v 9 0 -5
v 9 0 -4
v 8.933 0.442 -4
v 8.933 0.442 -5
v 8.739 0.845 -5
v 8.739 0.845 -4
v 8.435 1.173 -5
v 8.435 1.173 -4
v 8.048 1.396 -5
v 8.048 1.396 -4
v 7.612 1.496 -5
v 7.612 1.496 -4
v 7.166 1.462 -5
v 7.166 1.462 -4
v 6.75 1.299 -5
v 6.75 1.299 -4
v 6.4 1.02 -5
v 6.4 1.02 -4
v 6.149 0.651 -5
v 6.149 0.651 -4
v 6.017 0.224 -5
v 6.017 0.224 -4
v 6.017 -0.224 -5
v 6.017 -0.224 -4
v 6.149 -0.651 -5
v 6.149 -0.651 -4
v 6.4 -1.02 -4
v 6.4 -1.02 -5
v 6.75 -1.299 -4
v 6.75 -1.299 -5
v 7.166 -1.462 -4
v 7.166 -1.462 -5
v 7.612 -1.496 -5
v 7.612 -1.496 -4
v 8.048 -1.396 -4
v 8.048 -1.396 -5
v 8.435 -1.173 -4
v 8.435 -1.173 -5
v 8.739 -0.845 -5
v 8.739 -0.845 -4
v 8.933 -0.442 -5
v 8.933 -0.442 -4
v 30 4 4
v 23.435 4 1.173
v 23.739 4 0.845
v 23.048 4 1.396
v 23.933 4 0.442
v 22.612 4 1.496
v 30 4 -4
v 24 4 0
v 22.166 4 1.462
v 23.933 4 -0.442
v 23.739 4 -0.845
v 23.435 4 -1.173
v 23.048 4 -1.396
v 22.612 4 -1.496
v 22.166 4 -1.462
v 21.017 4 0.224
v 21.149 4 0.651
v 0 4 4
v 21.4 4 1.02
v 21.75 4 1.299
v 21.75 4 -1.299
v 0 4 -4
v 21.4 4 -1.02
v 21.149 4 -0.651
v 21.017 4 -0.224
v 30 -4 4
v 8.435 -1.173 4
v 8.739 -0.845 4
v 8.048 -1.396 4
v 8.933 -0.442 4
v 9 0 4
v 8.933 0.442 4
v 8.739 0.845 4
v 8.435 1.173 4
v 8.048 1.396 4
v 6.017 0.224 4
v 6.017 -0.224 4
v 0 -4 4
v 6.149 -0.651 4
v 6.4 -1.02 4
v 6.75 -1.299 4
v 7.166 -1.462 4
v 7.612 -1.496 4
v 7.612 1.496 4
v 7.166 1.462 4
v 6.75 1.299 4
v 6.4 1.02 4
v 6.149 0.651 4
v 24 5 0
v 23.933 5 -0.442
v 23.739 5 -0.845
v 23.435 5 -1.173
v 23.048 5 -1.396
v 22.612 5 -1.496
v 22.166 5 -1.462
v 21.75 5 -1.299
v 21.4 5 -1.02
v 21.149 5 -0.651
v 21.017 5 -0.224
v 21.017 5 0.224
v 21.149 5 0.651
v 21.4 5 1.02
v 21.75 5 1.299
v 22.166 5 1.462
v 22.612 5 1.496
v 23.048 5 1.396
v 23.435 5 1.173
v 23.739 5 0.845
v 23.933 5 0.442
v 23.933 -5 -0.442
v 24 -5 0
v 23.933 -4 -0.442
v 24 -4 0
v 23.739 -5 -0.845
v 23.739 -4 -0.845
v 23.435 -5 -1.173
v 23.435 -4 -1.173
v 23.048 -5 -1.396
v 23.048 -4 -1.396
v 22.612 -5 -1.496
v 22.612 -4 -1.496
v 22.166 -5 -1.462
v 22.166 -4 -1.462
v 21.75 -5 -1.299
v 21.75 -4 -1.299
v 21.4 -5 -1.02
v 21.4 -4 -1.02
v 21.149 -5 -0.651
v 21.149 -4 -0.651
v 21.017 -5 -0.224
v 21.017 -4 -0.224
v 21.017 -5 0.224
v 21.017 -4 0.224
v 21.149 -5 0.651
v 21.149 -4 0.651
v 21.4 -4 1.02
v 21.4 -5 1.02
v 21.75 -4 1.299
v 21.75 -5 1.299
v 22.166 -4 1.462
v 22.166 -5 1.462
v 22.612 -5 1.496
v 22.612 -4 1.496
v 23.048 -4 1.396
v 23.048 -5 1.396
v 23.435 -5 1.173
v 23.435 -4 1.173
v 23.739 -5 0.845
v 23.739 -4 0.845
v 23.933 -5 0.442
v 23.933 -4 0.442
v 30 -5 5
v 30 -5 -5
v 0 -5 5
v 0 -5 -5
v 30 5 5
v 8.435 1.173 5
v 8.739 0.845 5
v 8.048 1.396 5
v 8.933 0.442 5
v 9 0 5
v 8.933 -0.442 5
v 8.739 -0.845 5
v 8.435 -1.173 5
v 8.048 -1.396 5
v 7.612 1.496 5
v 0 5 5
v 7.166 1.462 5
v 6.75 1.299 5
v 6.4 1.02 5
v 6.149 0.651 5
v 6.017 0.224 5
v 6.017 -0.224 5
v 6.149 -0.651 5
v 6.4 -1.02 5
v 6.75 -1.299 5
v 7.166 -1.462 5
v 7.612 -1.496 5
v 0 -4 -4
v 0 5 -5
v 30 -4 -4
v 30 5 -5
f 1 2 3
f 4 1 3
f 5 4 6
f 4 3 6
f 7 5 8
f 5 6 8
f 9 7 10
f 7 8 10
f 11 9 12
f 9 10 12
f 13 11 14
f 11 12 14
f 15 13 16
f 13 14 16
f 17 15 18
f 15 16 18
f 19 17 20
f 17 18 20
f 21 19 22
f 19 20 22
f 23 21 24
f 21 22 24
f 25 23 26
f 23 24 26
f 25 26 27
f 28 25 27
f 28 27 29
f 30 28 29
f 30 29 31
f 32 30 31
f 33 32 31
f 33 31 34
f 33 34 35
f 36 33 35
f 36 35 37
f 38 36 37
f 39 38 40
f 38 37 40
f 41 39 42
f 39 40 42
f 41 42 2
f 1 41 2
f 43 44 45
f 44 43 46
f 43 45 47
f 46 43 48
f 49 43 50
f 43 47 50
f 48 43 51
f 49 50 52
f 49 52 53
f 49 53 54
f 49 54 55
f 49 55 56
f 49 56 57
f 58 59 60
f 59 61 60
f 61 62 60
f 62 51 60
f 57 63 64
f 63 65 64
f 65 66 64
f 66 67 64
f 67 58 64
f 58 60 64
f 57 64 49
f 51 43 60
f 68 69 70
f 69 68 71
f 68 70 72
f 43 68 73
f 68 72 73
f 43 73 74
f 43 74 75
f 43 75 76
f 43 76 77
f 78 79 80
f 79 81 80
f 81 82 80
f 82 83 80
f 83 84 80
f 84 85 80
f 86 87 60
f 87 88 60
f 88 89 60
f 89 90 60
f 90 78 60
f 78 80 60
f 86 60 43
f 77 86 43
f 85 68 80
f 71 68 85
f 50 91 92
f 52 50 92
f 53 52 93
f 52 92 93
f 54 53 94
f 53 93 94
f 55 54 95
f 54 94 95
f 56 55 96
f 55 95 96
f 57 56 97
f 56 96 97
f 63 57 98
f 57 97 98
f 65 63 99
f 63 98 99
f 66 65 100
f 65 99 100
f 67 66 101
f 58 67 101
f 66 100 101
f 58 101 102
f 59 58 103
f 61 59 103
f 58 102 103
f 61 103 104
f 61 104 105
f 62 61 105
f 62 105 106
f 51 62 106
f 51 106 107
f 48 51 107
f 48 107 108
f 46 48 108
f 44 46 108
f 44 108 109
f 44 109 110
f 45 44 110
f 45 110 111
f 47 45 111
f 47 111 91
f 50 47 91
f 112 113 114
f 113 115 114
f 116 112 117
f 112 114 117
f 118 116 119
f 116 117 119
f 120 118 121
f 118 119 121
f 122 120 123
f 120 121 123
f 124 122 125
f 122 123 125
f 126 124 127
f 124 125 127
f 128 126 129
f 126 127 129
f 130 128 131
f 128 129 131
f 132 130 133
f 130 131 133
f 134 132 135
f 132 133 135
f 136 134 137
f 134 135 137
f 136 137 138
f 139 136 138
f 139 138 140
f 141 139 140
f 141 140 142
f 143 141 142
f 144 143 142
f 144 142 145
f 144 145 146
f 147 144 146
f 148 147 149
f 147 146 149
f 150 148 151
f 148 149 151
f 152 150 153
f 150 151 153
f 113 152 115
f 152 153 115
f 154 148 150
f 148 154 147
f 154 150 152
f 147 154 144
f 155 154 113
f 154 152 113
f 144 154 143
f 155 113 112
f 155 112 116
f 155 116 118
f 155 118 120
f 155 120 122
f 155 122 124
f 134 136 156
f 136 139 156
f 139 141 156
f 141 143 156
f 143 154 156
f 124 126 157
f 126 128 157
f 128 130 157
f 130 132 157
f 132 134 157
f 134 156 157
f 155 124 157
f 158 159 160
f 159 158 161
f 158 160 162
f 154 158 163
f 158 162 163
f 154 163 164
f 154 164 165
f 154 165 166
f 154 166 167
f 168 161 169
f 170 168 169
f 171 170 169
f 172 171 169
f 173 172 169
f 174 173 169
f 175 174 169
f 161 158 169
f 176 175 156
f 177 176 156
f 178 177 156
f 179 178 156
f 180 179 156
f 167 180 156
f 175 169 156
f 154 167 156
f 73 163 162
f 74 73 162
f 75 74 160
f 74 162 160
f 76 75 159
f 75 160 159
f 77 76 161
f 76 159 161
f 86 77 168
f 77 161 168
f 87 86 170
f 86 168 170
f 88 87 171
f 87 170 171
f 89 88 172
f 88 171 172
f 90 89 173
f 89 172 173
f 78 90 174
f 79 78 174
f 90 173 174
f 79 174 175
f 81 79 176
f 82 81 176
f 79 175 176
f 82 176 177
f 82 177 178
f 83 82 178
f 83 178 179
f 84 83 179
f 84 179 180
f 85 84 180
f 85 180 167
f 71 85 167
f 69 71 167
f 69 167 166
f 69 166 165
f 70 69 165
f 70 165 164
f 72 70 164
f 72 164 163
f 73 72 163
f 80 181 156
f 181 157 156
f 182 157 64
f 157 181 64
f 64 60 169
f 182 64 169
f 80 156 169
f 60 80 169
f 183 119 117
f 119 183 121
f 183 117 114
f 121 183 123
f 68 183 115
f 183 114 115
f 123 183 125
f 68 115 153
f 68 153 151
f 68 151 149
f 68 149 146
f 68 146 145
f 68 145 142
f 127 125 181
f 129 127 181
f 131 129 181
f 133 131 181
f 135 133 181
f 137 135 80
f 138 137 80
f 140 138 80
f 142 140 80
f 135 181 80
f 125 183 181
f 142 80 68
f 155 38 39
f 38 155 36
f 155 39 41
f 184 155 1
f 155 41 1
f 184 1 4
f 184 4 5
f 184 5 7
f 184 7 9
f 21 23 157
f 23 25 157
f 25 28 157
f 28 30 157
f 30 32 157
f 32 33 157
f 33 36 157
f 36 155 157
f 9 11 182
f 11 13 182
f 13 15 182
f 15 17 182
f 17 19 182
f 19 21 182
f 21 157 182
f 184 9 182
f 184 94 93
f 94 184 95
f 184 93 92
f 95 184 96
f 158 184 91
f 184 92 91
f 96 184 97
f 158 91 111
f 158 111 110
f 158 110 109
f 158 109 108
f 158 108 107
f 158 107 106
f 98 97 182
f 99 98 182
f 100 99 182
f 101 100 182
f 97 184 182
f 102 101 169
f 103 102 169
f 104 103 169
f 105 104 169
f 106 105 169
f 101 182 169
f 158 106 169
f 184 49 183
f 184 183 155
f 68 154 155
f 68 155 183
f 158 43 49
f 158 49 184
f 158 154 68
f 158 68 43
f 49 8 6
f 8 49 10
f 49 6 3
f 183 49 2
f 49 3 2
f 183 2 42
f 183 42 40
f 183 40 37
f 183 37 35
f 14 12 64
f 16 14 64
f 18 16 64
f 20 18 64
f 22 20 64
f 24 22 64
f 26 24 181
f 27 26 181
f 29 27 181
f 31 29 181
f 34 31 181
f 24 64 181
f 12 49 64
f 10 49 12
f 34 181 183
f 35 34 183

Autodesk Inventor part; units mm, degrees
ref_plane "YZ Plane" through (0, 0, 0) normal (1, 0, 0) x (0, 1, 0)
ref_plane "XZ Plane" through (0, 0, 0) normal (0, 1, 0) x (-1, 0, 0)
ref_plane "XY Plane" through (0, 0, 0) normal (0, 0, 1) x (1, 0, 0)
sketch "スケッチ1" plane through (0, 0, 0) normal (1, 0, 0) x (0, 1, 0)
  line L0 (-5, -5) -> (5, -5)
  line L1 (5, -5) -> (5, 5)
  line L2 (5, 5) -> (-5, 5)
  line L3 (-5, 5) -> (-5, -5)
  line L4 (-5, -5) -> (5, 5) construction
  line L5 (5, -5) -> (-5, 5) construction
  line L6 (4, 4) -> (4, -4)
  line L7 (4, -4) -> (-4, -4)
  line L8 (-4, -4) -> (-4, 4)
  line L9 (-4, 4) -> (4, 4)
  point P0 (0, 0)
  dimension "d0" = 1
  dimension "d1" = 10
  dimension "d2" = 10
extrude "押し出し1" add sketch "スケッチ1" along normal blind 30
sketch "スケッチ2" plane through (0, -5, 5) normal (0, 0, 1) x (1, 0, 0)
  line L0 (0, 5) -> (30, 5) construction
  line L1 (30, 9) -> (30, 1) projected
  circle A0 centre (7.5, 5) radius 1.5
  line L2 (0, 10) -> (0, 0) projected
  dimension "d5" = 3
  dimension "d6" = 7.5
extrude "押し出し2" cut sketch "スケッチ2" against normal through all
sketch "スケッチ3" plane through (0, 5, 5) normal (0, 1, 0) x (1, 0, 0)
  line L0 (0, 5) -> (30, 5) construction
  line L1 (30, 0) -> (30, 10) projected
  circle A0 centre (22.5, 5) radius 1.5
  dimension "d9" = 3
  dimension "d10" = 7.5
extrude "押し出し3" cut sketch "スケッチ3" against normal through all
sketch "スケッチ4" plane through (0, 5, 5) normal (0, 1, 0) x (1, 0, 0)
  line L0 (30, 10) -> (30, 0) projected
  line L1 (0, 10) -> (0, 0) projected
  circle A0 centre (22.5, 5) radius 1.5 projected
  point P0 (0, 5)
  dimension "d13" = 30
  dimension "d14" = 22.5
sketch "スケッチ5" plane through (0, -5, 5) normal (0, 0, 1) x (1, 0, 0)
  line L0 (30, 10) -> (30, 0) projected
  line L1 (0, 10) -> (0, 0) projected
  circle A0 centre (7.5, 5) radius 1.5 projected
  point P0 (0, 5)
  dimension "d16" = 7.5
properties part number "omu_k_jo_5" material "アルミニウム 6061-AHC"
